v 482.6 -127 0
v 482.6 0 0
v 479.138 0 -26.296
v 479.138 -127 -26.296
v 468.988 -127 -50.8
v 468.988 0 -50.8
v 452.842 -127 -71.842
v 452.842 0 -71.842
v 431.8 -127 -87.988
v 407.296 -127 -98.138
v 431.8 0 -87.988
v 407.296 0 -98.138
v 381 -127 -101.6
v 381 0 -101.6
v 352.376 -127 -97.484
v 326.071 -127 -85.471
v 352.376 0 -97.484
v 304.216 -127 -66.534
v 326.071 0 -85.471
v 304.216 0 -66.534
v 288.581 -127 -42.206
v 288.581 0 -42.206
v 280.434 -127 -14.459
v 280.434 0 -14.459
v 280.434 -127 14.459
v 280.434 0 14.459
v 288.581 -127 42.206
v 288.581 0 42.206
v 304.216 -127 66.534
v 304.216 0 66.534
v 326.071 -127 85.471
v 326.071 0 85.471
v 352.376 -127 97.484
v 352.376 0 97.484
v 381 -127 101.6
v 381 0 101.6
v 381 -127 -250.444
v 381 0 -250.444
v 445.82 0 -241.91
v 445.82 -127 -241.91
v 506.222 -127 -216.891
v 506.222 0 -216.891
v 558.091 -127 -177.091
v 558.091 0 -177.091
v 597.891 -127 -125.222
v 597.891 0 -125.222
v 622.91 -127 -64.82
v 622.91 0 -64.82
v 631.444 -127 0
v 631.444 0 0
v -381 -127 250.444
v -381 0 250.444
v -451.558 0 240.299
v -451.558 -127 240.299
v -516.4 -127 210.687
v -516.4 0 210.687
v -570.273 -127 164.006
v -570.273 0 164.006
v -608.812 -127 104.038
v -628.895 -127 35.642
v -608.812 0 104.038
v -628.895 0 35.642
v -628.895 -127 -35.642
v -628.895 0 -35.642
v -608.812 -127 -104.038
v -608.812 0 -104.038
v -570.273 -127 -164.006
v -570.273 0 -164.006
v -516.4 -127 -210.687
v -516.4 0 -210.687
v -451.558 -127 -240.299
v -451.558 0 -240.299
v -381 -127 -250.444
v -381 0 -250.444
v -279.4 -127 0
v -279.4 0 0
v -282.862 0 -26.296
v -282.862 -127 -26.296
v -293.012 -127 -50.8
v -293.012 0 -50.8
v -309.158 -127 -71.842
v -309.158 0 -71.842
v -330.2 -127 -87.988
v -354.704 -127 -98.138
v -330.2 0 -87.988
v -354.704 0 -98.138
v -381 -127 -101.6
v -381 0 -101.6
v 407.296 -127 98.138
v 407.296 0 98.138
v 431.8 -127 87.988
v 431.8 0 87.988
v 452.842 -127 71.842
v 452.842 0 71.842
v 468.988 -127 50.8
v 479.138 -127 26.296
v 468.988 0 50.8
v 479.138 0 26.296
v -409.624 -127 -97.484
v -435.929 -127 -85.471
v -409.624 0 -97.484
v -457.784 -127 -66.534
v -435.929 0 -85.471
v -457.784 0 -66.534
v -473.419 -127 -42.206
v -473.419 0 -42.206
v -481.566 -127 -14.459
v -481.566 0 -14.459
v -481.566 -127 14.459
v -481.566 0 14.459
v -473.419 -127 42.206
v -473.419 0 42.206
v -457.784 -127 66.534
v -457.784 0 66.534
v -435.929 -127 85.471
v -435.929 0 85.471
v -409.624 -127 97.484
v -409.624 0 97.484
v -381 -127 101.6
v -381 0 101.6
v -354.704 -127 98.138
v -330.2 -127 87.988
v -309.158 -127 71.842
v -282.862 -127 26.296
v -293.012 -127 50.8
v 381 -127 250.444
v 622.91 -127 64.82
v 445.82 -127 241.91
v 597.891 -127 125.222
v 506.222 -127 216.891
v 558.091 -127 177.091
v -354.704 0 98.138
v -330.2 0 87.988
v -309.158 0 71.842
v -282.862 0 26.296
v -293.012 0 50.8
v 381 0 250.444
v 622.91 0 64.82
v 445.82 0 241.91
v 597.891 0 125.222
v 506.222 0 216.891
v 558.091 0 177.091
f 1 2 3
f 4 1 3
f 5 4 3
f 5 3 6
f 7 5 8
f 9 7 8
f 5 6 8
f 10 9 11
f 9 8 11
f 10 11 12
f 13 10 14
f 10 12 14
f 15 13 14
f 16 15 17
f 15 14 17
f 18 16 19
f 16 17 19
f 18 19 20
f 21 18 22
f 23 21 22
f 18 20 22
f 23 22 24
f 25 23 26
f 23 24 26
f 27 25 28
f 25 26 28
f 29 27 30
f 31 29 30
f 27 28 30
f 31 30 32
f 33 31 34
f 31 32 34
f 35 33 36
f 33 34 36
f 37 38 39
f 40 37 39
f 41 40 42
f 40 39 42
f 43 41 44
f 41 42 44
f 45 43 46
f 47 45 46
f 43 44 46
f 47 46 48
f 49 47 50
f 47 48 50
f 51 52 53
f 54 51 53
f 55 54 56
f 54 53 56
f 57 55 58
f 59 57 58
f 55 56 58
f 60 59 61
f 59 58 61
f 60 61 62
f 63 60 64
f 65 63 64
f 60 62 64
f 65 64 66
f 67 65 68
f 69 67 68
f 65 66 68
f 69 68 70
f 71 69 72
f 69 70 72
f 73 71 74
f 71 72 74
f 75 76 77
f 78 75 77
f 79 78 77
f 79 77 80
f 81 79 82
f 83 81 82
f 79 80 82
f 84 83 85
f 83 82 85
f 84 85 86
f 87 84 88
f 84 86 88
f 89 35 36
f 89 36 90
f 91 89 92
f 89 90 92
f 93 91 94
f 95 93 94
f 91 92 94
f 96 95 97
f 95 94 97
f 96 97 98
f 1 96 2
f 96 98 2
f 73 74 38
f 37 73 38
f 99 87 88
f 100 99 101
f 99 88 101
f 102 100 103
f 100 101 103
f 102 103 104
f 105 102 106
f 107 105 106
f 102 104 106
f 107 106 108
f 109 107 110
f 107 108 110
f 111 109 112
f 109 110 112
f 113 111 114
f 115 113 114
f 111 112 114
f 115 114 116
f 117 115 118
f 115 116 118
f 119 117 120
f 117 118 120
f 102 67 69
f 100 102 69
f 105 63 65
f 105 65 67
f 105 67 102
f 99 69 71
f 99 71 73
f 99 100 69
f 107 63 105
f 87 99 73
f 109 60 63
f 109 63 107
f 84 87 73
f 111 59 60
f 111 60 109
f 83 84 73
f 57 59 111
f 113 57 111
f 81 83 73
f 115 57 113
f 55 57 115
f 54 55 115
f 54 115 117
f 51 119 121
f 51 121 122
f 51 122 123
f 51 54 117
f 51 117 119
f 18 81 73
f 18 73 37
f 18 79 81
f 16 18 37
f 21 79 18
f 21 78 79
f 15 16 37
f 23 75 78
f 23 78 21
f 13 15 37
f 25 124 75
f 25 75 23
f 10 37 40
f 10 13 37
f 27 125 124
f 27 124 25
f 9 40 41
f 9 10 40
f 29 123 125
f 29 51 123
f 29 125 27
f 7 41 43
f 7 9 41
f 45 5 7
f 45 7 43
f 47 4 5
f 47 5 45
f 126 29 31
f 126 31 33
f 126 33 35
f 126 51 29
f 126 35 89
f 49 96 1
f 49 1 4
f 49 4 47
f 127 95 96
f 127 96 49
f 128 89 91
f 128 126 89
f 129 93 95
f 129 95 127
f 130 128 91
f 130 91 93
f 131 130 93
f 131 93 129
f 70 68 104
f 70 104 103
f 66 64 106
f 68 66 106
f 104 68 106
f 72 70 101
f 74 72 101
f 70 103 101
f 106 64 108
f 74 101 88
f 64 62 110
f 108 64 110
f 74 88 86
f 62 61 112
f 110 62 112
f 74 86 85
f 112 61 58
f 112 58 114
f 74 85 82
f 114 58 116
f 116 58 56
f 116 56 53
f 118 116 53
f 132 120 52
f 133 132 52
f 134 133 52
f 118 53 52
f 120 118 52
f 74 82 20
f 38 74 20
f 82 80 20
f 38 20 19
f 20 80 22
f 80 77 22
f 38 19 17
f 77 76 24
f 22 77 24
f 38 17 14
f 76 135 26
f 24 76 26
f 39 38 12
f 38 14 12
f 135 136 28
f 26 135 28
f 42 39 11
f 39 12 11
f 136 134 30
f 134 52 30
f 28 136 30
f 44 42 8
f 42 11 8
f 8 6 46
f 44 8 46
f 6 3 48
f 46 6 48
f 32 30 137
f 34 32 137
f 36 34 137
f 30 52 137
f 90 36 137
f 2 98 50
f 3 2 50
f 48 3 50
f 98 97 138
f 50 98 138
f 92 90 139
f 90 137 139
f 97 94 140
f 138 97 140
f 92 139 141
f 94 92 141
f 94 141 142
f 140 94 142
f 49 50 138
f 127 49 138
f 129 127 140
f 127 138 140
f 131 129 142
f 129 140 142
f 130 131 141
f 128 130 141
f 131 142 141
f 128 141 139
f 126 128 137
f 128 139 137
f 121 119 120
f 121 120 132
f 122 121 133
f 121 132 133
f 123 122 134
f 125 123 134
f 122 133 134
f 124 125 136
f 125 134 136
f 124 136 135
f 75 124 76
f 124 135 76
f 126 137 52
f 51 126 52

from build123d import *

# Parameters (mm, degrees)
F1_DEPTH = 127


with BuildPart() as f1:
    # F0 (on Front) → F1 (new body)
    with BuildSketch(Plane.XZ):
        with BuildLine():
            ThreePointArc((-130.556, 0), (-203.909349, 177.090651), (-381, 250.444))
            Line((-381, 250.444), (-381, 101.6))
            ThreePointArc((-381, 101.6), (-309.157951, 71.842049), (-279.4, 0))
            ThreePointArc((-279.4, 0), (-309.157951, -71.842049), (-381, -101.6))
            Line((-381, -101.6), (-381, -250.444))
            ThreePointArc((-381, -250.444), (-203.909349, -177.090651), (-130.556, 0))
        make_face()
        with BuildLine():
            Line((-381, 101.6), (-381, 250.444))
            ThreePointArc((-381, 250.444), (-631.444, 0), (-381, -250.444))
            Line((-381, -250.444), (-381, -101.6))
            ThreePointArc((-381, -101.6), (-482.6, 0), (-381, 101.6))
        make_face()
        with BuildLine():
            Line((381, 250.444), (-381, 250.444))
            ThreePointArc((-381, 250.444), (-203.909349, 177.090651), (-130.556, 0))
            ThreePointArc((-130.556, 0), (-203.909349, -177.090651), (-381, -250.444))
            Line((-381, -250.444), (381, -250.444))
            ThreePointArc((381, -250.444), (130.556, 0), (381, 250.444))
        make_face()
        with BuildLine():
            ThreePointArc((631.444, 0), (558.090651, 177.090651), (381, 250.444))
            Line((381, 250.444), (381, 101.6))
            ThreePointArc((381, 101.6), (452.842049, 71.842049), (482.6, 0))
            ThreePointArc((482.6, 0), (452.842049, -71.842049), (381, -101.6))
            Line((381, -101.6), (381, -250.444))
            ThreePointArc((381, -250.444), (558.090651, -177.090651), (631.444, 0))
        make_face()
        with BuildLine():
            Line((381, 101.6), (381, 250.444))
            ThreePointArc((381, 250.444), (130.556, 0), (381, -250.444))
            Line((381, -250.444), (381, -101.6))
            ThreePointArc((381, -101.6), (279.4, 0), (381, 101.6))
        make_face()
    extrude(amount=F1_DEPTH)


solid = f1.part
